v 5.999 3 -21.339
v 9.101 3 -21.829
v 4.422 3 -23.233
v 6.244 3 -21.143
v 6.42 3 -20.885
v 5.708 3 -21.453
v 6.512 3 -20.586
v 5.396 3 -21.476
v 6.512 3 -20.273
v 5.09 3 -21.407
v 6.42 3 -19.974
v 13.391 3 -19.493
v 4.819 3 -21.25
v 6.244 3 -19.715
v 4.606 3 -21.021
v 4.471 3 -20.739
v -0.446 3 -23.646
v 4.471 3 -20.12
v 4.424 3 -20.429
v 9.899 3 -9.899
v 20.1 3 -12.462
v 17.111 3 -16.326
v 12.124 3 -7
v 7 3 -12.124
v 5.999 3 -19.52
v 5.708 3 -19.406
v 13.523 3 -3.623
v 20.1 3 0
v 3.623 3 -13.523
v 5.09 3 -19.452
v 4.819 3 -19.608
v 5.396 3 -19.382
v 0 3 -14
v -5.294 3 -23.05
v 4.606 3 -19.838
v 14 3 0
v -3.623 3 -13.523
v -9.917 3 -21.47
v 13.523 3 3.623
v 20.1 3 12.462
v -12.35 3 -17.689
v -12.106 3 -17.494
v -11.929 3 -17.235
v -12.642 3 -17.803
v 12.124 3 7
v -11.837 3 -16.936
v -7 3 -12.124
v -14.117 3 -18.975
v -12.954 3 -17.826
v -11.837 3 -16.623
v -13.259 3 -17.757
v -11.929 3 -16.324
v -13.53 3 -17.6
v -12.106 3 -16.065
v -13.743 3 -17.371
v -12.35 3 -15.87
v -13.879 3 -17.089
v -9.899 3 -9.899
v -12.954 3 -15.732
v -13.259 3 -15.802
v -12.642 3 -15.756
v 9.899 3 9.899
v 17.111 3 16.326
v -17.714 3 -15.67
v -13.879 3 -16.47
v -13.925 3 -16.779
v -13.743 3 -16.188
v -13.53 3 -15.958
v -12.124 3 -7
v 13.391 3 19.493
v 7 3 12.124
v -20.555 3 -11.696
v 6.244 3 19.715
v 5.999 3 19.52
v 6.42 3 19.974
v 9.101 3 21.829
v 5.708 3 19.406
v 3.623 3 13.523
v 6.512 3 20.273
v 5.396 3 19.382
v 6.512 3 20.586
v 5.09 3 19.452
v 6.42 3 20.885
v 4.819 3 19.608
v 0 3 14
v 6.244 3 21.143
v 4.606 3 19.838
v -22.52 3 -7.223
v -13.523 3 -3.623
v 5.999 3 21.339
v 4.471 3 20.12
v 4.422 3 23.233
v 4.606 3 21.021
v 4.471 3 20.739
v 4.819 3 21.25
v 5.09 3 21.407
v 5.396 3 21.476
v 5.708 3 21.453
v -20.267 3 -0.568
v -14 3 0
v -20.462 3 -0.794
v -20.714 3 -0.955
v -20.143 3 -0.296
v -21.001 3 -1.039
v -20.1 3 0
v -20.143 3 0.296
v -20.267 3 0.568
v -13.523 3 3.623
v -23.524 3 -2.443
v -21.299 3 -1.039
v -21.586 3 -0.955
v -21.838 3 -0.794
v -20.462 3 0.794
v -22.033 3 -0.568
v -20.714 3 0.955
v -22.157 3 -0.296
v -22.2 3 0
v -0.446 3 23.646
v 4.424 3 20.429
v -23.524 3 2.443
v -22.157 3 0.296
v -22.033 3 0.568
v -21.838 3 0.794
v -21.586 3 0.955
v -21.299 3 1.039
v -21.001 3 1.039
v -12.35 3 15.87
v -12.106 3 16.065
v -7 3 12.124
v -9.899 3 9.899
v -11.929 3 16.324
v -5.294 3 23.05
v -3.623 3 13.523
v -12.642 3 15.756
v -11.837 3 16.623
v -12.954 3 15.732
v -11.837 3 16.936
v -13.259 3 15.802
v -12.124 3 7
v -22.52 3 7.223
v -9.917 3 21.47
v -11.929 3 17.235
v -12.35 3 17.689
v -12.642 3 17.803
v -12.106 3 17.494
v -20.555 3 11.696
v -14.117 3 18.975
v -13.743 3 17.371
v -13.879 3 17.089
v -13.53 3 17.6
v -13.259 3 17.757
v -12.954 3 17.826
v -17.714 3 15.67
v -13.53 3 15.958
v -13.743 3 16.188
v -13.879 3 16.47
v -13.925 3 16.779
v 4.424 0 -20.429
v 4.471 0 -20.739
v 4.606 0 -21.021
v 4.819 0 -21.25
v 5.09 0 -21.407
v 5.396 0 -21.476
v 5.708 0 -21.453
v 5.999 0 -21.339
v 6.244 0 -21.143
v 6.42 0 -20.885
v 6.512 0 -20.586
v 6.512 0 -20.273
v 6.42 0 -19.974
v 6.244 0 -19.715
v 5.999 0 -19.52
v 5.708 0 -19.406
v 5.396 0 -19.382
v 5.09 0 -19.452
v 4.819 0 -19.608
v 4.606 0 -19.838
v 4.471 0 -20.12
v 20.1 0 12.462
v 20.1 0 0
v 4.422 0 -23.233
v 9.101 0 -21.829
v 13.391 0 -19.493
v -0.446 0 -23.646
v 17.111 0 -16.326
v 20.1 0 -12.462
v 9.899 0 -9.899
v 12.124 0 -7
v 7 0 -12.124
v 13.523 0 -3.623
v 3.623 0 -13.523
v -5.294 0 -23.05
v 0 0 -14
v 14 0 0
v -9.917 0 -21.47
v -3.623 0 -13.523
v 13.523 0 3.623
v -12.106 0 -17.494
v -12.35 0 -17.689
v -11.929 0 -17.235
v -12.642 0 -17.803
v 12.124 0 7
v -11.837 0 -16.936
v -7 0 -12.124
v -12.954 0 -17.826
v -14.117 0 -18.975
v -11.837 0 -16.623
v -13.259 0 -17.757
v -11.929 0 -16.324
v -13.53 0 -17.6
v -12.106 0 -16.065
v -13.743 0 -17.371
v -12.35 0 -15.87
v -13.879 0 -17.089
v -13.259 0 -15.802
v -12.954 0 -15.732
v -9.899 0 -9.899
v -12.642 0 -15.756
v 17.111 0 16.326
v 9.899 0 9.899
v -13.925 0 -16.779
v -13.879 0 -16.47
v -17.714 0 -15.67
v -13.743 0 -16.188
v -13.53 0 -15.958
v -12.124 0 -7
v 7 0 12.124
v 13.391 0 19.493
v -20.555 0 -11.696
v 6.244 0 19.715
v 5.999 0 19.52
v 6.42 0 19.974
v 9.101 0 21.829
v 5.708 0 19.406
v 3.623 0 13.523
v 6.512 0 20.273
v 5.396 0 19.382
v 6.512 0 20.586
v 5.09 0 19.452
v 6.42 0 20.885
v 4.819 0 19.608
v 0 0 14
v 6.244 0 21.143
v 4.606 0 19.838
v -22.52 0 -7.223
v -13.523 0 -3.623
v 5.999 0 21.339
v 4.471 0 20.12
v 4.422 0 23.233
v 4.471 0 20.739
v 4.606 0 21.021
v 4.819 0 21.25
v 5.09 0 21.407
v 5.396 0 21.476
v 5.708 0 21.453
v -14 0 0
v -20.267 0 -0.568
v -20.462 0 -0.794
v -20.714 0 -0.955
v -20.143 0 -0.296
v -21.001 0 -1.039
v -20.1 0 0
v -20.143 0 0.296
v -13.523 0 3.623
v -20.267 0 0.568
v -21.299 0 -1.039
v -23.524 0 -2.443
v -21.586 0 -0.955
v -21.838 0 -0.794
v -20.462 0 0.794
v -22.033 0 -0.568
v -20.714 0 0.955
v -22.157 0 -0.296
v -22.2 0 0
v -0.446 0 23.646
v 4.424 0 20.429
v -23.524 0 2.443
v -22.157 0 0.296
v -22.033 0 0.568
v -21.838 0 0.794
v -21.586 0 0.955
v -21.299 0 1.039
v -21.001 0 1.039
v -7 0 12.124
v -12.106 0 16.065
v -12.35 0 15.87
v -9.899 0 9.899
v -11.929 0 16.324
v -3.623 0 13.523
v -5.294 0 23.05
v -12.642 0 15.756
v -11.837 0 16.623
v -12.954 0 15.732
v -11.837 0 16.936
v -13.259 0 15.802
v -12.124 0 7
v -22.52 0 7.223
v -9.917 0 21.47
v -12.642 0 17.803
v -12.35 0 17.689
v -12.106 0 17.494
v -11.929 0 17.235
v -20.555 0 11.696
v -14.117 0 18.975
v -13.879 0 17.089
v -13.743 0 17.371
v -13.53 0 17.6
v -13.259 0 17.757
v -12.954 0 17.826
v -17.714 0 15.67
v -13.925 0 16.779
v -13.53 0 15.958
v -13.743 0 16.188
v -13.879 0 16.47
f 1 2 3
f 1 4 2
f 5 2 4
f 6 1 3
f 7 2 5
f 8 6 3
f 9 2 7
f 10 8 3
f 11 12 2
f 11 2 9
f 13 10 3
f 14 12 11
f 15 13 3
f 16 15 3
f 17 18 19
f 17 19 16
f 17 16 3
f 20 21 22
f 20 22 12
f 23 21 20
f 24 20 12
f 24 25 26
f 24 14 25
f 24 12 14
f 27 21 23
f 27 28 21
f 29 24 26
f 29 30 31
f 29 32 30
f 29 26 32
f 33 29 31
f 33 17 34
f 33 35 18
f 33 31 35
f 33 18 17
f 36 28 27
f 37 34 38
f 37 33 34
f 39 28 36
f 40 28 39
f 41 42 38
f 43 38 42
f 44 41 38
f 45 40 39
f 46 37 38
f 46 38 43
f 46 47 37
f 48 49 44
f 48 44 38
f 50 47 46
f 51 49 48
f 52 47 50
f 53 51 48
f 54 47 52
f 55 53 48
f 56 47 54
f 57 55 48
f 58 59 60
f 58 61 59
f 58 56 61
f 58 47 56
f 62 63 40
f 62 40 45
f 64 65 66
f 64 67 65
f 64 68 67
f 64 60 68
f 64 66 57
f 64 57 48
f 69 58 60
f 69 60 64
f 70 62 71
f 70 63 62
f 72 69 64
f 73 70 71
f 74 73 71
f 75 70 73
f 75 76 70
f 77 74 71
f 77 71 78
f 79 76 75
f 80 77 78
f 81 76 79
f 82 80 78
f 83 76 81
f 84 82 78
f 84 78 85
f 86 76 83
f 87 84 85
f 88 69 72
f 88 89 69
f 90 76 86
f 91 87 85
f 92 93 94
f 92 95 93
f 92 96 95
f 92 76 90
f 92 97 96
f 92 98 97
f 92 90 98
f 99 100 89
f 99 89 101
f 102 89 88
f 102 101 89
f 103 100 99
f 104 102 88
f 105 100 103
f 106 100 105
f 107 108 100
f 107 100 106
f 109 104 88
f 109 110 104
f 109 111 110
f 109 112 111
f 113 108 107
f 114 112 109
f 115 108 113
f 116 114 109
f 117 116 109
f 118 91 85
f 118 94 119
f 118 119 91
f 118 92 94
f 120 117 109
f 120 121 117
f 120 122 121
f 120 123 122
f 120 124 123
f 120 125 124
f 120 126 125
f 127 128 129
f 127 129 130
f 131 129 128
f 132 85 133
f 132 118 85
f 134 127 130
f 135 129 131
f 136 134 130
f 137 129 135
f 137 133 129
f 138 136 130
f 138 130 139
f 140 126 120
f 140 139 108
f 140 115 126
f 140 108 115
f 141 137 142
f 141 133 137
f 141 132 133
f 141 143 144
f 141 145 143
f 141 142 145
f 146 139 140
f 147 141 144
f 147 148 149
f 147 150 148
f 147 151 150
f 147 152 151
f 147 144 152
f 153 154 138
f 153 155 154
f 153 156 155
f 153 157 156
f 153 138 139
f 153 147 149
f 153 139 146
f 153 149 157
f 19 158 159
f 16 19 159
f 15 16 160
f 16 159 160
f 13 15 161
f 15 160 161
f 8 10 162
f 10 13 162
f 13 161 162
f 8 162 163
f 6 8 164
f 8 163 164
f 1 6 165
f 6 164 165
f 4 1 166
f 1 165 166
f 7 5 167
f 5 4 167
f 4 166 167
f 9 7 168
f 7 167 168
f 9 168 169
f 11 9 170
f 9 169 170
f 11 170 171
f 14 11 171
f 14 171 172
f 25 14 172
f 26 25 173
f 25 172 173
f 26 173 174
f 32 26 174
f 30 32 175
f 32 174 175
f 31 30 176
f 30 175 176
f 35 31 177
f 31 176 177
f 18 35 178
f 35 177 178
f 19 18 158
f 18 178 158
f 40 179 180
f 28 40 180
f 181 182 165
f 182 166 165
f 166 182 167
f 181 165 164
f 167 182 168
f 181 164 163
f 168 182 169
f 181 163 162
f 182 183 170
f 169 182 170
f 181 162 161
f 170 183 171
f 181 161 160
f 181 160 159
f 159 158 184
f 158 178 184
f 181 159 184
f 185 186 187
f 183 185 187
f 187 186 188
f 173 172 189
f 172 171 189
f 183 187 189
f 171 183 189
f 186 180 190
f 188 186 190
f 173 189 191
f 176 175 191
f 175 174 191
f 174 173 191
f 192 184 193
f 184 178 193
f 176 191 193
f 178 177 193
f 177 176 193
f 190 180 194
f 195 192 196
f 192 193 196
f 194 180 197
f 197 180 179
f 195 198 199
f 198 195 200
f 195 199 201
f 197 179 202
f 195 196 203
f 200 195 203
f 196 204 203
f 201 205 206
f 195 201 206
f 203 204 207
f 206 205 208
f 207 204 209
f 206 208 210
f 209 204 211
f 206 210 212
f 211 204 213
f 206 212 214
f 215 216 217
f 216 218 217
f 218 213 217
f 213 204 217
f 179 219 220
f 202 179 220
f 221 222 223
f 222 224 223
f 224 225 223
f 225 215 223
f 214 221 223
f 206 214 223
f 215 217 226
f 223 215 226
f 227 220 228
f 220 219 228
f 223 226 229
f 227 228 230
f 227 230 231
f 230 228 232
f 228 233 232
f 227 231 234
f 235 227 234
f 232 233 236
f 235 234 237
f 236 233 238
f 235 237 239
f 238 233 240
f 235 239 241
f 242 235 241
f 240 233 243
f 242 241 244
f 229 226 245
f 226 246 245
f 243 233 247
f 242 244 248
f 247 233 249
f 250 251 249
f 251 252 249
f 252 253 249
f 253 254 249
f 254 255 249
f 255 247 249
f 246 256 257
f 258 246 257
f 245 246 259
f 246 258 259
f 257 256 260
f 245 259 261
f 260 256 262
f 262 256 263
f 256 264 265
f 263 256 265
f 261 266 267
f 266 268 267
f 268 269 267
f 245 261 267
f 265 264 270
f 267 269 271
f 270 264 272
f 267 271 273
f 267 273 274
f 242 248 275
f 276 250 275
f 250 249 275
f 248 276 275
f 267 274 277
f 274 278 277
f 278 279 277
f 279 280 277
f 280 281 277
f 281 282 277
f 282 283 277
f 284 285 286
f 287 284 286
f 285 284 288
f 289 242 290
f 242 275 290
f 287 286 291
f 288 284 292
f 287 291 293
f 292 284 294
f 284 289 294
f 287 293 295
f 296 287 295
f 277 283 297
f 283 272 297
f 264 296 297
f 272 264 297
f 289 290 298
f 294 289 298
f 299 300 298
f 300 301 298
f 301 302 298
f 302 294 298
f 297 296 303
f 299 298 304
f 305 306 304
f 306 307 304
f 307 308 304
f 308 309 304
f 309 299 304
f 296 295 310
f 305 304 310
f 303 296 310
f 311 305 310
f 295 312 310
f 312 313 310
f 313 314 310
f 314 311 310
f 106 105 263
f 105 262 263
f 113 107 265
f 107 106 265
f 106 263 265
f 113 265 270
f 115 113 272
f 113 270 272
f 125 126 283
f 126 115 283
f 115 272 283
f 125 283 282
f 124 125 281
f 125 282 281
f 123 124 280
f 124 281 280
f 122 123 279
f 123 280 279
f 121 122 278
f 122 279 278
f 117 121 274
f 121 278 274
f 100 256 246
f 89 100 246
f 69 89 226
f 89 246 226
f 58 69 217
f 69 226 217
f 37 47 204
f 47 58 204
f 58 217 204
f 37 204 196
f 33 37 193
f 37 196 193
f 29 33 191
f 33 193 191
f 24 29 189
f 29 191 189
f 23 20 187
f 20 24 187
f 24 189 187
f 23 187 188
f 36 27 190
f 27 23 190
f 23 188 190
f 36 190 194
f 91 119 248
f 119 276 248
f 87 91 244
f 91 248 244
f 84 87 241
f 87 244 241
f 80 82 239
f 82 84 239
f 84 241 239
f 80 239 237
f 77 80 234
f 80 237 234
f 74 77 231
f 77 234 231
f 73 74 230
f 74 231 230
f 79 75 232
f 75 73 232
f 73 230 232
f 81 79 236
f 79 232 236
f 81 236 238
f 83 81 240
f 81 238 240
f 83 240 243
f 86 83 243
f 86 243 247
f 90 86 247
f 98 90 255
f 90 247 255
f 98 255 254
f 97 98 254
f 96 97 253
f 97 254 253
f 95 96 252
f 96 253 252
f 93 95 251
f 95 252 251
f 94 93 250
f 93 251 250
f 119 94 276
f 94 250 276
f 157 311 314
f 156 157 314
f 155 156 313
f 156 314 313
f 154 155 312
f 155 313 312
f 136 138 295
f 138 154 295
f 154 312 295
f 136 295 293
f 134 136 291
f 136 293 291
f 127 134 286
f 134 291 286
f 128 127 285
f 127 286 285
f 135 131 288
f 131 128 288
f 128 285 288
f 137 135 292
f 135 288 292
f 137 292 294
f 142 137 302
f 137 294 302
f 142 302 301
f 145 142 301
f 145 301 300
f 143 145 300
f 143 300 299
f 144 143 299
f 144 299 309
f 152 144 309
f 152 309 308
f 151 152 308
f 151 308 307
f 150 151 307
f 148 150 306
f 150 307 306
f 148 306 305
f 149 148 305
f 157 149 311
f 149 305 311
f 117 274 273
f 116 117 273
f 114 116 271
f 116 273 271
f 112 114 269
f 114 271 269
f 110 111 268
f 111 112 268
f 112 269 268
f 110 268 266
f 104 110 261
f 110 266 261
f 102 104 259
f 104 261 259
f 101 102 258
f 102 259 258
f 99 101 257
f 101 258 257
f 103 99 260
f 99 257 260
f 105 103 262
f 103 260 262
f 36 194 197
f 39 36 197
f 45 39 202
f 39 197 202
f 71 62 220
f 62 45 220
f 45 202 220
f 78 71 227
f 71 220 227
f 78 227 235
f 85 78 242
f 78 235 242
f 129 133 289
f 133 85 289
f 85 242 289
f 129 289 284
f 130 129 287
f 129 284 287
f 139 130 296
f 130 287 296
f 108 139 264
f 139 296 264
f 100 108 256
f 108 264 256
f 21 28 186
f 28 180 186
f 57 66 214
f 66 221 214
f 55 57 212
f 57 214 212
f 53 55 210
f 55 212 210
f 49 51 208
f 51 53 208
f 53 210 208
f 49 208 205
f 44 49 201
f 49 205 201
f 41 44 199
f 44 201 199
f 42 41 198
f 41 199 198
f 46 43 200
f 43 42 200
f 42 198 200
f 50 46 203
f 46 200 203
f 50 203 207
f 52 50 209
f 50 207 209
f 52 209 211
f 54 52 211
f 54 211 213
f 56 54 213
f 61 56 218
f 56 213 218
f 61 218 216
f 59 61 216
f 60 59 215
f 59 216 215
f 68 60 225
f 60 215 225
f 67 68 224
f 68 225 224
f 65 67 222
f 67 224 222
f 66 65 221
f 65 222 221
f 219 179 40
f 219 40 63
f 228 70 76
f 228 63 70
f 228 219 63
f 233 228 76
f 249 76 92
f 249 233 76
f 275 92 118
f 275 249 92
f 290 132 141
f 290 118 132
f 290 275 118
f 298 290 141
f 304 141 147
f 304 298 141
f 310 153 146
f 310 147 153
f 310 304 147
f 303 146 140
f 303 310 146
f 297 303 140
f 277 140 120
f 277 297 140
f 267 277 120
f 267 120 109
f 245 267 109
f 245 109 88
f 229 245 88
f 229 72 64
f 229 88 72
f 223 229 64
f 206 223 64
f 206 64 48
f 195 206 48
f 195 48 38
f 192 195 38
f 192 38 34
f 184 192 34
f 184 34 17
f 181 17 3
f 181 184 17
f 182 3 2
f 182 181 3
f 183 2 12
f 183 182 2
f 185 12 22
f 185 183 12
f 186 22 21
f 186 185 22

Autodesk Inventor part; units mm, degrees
ref_plane "YZ Plane" through (0, 0, 0) normal (1, 0, 0) x (0, 1, 0)
ref_plane "XZ Plane" through (0, 0, 0) normal (0, 1, 0) x (-1, 0, 0)
ref_plane "XY Plane" through (0, 0, 0) normal (0, 0, 1) x (1, 0, 0)
sketch "Эскиз1" plane through (0, 0, 0) normal (0, 1, 0) x (-1, 0, 0)
  circle A0 centre (0, 0) radius 14
  arc A1 (-20.1, -12.4624) -> (-20.1, 12.4624) centre (0, 0) ccw
  line L0 (-20.1, 12.4624) -> (-20.1, -12.4624)
  line L1 (-20.1, 0) -> (21.15, 0)
  circle A2 centre (21.15, 0) radius 1.05
  circle A3 centre (12.8753, 16.7794) radius 1.05
  circle A4 centre (-5.474, 20.4293) radius 1.05
  circle A5 centre (12.8753, -16.7794) radius 1.05
  circle A6 centre (-5.474, -20.4293) radius 1.05
  dimension "d0" = 28
  dimension "d1" = 47.3
  dimension "d3" = 2.1
  dimension "d4" = 21.15
  dimension "d11" = 20.1
  dimension "d24" = 105
  dimension "d28" = 105
extrude "Выдавливание3" add sketch "Эскиз1" along normal blind 3
properties part number "держалка подша"
